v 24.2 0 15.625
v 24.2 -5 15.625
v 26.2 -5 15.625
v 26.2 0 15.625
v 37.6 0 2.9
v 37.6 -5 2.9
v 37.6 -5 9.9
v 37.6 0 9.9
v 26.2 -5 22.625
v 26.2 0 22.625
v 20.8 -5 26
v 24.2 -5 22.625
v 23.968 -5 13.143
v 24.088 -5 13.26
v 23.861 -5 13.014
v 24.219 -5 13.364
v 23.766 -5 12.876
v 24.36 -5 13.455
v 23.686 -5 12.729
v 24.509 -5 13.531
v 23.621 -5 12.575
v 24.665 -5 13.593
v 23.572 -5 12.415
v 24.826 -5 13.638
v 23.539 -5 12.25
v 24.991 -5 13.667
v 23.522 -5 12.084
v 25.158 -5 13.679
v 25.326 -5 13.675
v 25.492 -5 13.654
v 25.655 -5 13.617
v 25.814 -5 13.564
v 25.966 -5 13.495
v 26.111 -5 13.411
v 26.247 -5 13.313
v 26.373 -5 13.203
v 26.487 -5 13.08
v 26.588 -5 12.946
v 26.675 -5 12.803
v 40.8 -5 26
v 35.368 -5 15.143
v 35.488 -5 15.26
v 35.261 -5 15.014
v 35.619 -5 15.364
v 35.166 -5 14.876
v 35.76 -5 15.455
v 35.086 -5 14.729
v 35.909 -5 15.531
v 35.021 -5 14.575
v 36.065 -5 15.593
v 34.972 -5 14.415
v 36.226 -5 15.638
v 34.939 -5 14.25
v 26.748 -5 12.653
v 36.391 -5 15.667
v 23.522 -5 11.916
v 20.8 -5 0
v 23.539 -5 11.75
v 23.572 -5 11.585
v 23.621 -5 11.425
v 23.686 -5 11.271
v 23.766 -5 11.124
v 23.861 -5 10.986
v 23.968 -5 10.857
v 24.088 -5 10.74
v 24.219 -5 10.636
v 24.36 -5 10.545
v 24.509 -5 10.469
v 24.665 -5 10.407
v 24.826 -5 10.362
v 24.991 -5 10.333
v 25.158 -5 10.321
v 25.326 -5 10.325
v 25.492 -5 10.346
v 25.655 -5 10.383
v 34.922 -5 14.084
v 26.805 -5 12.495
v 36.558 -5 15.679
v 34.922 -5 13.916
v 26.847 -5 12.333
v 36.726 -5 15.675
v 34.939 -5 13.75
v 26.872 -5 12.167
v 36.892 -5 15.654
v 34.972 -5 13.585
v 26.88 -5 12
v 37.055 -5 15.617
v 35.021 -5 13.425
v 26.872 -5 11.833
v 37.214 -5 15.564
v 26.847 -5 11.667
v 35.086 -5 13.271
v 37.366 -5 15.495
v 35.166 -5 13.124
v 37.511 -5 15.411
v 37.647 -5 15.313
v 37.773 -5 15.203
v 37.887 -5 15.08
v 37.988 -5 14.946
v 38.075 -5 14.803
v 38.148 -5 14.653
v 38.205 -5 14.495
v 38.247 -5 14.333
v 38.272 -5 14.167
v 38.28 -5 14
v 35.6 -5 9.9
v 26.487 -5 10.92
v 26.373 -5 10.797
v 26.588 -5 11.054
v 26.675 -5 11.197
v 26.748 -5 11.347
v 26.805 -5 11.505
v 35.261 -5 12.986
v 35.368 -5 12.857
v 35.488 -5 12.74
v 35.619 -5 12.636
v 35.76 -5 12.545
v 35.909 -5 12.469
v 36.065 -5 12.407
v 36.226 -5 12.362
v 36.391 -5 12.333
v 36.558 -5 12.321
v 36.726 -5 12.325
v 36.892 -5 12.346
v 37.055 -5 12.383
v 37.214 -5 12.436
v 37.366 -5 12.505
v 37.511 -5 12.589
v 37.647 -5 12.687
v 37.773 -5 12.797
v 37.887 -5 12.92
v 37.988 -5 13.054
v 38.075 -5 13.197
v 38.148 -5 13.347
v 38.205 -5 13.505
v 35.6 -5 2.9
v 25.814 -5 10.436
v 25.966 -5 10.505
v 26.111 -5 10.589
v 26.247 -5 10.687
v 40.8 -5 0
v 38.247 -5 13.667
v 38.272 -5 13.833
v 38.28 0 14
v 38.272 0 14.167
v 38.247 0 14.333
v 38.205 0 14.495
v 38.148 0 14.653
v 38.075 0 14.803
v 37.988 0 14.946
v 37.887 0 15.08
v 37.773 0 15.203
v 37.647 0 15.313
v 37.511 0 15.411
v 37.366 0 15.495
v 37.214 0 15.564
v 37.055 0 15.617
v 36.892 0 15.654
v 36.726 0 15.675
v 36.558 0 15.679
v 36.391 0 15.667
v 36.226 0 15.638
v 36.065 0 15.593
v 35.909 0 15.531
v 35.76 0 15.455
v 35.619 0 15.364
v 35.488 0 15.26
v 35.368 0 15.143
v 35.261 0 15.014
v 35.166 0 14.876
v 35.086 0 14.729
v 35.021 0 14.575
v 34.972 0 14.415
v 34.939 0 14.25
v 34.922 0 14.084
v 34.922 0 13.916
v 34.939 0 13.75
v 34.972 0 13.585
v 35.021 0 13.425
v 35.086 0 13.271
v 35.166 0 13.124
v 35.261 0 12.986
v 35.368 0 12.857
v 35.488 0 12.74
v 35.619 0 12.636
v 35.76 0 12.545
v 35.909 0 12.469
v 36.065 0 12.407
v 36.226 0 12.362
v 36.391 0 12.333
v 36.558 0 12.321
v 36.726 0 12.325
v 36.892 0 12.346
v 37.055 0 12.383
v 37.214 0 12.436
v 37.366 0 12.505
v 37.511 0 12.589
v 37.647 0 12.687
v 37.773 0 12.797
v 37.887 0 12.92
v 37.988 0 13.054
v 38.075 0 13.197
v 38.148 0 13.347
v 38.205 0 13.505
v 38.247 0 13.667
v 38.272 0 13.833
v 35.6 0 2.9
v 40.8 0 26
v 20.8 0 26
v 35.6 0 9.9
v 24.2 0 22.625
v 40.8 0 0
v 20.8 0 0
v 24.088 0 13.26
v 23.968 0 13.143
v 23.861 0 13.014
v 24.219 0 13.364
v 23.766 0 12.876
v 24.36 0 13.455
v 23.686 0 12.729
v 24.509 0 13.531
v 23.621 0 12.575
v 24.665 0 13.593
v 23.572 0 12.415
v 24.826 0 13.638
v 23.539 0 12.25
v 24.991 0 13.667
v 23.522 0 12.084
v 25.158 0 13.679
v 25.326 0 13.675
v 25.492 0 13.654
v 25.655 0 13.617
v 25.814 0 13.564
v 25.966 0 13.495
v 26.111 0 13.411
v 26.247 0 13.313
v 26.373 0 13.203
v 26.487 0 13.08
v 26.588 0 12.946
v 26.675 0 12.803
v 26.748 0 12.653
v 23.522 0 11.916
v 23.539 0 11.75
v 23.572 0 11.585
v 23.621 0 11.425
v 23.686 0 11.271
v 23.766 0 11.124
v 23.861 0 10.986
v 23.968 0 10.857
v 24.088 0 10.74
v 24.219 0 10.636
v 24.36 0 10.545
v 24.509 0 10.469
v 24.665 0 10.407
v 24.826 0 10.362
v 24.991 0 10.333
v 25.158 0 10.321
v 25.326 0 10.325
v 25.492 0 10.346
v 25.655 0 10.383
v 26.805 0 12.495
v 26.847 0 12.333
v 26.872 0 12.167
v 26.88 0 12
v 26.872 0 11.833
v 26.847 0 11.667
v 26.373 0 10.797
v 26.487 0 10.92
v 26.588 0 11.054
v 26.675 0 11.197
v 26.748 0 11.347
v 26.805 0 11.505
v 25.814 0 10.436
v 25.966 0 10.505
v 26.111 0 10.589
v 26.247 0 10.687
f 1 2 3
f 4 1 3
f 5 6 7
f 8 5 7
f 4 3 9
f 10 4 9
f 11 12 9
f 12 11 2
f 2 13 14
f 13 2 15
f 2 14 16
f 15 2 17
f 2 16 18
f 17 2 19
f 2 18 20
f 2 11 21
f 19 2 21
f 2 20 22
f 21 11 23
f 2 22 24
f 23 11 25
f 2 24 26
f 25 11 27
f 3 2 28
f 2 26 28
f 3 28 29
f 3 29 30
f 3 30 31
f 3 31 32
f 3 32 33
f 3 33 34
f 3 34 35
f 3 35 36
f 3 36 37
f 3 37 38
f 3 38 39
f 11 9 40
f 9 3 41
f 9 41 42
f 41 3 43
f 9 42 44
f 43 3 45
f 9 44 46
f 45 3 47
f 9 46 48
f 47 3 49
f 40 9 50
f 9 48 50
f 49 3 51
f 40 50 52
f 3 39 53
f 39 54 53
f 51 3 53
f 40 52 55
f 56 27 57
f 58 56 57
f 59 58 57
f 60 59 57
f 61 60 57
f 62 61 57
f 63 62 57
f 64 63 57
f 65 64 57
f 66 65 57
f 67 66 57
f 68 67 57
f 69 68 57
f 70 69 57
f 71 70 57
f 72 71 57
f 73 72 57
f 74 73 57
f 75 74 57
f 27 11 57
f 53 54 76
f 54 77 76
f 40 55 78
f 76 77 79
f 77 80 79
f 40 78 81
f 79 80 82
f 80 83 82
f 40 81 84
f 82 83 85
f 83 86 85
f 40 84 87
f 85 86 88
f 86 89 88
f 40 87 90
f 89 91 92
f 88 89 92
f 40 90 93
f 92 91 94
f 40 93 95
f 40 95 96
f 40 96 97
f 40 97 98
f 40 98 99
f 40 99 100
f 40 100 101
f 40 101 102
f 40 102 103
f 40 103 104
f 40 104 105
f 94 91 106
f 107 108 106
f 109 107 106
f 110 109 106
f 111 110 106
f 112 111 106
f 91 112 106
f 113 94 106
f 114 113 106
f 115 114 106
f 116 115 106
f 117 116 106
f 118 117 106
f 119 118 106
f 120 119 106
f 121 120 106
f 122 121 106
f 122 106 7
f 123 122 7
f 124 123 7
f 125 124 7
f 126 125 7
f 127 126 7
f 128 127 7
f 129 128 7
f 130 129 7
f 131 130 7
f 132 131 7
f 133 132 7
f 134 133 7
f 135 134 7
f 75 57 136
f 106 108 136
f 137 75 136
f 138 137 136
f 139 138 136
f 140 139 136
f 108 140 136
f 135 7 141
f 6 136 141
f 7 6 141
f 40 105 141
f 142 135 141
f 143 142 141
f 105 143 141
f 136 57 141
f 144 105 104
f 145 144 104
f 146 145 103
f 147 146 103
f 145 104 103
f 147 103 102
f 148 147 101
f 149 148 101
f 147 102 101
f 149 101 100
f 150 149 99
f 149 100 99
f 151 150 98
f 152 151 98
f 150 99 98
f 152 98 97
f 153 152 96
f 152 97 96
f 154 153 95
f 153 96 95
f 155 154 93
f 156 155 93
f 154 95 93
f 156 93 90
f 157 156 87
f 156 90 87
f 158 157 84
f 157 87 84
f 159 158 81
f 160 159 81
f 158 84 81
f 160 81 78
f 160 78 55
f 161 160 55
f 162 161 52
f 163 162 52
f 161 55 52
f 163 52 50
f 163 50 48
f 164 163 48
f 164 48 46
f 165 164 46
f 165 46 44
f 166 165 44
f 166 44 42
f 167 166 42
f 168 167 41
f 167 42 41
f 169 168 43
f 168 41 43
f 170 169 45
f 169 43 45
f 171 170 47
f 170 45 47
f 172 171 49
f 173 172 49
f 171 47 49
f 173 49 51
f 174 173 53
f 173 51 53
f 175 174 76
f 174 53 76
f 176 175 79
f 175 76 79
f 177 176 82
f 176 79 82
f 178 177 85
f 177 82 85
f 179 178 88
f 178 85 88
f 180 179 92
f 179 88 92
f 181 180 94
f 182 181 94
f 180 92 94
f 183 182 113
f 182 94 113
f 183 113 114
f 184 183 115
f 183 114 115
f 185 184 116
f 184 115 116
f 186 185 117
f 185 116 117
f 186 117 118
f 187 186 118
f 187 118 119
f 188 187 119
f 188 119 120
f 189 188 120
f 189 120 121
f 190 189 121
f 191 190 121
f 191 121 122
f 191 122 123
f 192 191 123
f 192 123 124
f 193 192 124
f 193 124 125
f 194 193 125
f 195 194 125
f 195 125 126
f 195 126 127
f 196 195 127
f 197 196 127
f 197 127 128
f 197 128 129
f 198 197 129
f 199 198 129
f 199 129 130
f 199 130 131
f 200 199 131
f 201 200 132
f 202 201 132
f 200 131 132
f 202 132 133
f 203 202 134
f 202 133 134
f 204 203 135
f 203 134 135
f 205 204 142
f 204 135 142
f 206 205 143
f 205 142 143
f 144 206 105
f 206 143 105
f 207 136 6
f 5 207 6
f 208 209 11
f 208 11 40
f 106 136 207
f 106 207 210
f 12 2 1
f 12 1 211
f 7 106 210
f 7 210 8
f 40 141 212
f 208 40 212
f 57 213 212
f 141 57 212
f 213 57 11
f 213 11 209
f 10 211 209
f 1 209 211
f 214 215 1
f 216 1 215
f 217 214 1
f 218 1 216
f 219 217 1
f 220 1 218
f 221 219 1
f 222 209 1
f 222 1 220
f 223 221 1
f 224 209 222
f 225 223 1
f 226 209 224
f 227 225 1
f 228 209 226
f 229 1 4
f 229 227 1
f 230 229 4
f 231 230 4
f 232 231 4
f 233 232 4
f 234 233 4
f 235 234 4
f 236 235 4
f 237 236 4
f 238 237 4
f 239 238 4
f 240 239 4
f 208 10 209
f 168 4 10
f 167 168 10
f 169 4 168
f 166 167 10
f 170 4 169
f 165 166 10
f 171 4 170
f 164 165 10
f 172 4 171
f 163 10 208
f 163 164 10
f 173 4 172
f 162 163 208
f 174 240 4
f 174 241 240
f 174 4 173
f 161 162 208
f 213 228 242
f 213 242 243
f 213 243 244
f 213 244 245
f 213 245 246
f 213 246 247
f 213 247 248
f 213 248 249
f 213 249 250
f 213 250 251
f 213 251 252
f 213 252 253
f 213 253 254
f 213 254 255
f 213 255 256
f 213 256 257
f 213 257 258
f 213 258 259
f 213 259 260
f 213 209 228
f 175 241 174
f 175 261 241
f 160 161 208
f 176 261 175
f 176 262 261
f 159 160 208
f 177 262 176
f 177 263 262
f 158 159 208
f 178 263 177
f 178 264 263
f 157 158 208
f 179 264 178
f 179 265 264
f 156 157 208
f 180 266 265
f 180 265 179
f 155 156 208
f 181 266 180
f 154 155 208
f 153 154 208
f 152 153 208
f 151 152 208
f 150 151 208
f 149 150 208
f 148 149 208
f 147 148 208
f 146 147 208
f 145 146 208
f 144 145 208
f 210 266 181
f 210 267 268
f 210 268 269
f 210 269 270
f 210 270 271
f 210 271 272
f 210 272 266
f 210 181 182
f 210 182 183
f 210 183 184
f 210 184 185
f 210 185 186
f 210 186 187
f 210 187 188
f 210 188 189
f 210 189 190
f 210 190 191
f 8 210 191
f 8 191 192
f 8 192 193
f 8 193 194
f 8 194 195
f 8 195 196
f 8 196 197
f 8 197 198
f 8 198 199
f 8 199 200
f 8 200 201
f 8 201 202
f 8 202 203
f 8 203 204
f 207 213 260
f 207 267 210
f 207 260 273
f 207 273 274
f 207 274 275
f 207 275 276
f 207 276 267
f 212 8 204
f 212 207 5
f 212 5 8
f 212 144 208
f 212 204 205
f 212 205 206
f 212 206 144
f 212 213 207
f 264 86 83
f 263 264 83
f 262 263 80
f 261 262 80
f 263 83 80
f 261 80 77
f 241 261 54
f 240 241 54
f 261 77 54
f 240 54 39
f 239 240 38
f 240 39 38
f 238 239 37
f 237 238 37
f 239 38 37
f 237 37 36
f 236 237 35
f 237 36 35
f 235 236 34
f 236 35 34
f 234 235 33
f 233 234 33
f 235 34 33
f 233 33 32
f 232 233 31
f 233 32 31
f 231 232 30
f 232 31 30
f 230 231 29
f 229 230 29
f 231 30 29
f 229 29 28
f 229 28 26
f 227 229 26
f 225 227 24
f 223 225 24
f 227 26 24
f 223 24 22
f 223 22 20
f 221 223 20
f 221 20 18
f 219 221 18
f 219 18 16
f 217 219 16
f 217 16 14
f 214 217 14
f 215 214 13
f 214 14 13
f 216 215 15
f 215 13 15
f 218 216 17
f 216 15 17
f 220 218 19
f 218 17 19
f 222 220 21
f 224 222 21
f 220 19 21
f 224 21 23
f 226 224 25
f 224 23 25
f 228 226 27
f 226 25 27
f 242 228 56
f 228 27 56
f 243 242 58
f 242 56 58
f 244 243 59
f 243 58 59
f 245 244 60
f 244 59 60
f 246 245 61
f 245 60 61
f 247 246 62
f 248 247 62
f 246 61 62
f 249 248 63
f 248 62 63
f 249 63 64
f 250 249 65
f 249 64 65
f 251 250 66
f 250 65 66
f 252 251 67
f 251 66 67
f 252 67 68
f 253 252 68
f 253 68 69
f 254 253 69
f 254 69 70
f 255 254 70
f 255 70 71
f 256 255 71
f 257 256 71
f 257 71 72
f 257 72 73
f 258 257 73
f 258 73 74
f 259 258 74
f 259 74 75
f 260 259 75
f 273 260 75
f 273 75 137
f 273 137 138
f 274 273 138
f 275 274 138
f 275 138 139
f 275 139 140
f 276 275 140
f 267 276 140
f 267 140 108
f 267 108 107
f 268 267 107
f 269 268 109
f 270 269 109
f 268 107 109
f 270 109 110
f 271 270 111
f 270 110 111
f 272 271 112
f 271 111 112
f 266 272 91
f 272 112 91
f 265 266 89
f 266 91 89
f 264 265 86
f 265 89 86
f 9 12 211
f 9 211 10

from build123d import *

# Parameters (mm, degrees)
BOX002_W        = 20
BOX002_H        = 5
BOX002_DEPTH    = 26
SKETCH_R        = 1.68
SKETCH_W        = 2
SKETCH_H        = 7
POCKET014_DEPTH = 5


with BuildPart() as part:
    # Box002 → Box002 (new body)
    with BuildSketch(Plane(origin=(20.8, -5, 0), x_dir=(1, 0, 0), z_dir=(0, 0, 1))):
        with Locations((10, 2.5)):
            Rectangle(BOX002_W, BOX002_H)
    extrude(amount=BOX002_DEPTH)

    # Sketch → Pocket014 (cut)
    with BuildSketch(Plane(origin=(20.8, -5, 0), x_dir=(1, 0, 0), z_dir=(0, -1, 0))):
        with Locations((4.4, 12)):
            Circle(SKETCH_R)
        with Locations((15.8, 14)):
            Circle(SKETCH_R)
        with Locations((4.4, 19.125)):
            Rectangle(SKETCH_W, SKETCH_H)
        with Locations((15.8, 6.4)):
            Rectangle(SKETCH_W, SKETCH_H)
    extrude(amount=-POCKET014_DEPTH, mode=Mode.SUBTRACT)


solid = part.part
